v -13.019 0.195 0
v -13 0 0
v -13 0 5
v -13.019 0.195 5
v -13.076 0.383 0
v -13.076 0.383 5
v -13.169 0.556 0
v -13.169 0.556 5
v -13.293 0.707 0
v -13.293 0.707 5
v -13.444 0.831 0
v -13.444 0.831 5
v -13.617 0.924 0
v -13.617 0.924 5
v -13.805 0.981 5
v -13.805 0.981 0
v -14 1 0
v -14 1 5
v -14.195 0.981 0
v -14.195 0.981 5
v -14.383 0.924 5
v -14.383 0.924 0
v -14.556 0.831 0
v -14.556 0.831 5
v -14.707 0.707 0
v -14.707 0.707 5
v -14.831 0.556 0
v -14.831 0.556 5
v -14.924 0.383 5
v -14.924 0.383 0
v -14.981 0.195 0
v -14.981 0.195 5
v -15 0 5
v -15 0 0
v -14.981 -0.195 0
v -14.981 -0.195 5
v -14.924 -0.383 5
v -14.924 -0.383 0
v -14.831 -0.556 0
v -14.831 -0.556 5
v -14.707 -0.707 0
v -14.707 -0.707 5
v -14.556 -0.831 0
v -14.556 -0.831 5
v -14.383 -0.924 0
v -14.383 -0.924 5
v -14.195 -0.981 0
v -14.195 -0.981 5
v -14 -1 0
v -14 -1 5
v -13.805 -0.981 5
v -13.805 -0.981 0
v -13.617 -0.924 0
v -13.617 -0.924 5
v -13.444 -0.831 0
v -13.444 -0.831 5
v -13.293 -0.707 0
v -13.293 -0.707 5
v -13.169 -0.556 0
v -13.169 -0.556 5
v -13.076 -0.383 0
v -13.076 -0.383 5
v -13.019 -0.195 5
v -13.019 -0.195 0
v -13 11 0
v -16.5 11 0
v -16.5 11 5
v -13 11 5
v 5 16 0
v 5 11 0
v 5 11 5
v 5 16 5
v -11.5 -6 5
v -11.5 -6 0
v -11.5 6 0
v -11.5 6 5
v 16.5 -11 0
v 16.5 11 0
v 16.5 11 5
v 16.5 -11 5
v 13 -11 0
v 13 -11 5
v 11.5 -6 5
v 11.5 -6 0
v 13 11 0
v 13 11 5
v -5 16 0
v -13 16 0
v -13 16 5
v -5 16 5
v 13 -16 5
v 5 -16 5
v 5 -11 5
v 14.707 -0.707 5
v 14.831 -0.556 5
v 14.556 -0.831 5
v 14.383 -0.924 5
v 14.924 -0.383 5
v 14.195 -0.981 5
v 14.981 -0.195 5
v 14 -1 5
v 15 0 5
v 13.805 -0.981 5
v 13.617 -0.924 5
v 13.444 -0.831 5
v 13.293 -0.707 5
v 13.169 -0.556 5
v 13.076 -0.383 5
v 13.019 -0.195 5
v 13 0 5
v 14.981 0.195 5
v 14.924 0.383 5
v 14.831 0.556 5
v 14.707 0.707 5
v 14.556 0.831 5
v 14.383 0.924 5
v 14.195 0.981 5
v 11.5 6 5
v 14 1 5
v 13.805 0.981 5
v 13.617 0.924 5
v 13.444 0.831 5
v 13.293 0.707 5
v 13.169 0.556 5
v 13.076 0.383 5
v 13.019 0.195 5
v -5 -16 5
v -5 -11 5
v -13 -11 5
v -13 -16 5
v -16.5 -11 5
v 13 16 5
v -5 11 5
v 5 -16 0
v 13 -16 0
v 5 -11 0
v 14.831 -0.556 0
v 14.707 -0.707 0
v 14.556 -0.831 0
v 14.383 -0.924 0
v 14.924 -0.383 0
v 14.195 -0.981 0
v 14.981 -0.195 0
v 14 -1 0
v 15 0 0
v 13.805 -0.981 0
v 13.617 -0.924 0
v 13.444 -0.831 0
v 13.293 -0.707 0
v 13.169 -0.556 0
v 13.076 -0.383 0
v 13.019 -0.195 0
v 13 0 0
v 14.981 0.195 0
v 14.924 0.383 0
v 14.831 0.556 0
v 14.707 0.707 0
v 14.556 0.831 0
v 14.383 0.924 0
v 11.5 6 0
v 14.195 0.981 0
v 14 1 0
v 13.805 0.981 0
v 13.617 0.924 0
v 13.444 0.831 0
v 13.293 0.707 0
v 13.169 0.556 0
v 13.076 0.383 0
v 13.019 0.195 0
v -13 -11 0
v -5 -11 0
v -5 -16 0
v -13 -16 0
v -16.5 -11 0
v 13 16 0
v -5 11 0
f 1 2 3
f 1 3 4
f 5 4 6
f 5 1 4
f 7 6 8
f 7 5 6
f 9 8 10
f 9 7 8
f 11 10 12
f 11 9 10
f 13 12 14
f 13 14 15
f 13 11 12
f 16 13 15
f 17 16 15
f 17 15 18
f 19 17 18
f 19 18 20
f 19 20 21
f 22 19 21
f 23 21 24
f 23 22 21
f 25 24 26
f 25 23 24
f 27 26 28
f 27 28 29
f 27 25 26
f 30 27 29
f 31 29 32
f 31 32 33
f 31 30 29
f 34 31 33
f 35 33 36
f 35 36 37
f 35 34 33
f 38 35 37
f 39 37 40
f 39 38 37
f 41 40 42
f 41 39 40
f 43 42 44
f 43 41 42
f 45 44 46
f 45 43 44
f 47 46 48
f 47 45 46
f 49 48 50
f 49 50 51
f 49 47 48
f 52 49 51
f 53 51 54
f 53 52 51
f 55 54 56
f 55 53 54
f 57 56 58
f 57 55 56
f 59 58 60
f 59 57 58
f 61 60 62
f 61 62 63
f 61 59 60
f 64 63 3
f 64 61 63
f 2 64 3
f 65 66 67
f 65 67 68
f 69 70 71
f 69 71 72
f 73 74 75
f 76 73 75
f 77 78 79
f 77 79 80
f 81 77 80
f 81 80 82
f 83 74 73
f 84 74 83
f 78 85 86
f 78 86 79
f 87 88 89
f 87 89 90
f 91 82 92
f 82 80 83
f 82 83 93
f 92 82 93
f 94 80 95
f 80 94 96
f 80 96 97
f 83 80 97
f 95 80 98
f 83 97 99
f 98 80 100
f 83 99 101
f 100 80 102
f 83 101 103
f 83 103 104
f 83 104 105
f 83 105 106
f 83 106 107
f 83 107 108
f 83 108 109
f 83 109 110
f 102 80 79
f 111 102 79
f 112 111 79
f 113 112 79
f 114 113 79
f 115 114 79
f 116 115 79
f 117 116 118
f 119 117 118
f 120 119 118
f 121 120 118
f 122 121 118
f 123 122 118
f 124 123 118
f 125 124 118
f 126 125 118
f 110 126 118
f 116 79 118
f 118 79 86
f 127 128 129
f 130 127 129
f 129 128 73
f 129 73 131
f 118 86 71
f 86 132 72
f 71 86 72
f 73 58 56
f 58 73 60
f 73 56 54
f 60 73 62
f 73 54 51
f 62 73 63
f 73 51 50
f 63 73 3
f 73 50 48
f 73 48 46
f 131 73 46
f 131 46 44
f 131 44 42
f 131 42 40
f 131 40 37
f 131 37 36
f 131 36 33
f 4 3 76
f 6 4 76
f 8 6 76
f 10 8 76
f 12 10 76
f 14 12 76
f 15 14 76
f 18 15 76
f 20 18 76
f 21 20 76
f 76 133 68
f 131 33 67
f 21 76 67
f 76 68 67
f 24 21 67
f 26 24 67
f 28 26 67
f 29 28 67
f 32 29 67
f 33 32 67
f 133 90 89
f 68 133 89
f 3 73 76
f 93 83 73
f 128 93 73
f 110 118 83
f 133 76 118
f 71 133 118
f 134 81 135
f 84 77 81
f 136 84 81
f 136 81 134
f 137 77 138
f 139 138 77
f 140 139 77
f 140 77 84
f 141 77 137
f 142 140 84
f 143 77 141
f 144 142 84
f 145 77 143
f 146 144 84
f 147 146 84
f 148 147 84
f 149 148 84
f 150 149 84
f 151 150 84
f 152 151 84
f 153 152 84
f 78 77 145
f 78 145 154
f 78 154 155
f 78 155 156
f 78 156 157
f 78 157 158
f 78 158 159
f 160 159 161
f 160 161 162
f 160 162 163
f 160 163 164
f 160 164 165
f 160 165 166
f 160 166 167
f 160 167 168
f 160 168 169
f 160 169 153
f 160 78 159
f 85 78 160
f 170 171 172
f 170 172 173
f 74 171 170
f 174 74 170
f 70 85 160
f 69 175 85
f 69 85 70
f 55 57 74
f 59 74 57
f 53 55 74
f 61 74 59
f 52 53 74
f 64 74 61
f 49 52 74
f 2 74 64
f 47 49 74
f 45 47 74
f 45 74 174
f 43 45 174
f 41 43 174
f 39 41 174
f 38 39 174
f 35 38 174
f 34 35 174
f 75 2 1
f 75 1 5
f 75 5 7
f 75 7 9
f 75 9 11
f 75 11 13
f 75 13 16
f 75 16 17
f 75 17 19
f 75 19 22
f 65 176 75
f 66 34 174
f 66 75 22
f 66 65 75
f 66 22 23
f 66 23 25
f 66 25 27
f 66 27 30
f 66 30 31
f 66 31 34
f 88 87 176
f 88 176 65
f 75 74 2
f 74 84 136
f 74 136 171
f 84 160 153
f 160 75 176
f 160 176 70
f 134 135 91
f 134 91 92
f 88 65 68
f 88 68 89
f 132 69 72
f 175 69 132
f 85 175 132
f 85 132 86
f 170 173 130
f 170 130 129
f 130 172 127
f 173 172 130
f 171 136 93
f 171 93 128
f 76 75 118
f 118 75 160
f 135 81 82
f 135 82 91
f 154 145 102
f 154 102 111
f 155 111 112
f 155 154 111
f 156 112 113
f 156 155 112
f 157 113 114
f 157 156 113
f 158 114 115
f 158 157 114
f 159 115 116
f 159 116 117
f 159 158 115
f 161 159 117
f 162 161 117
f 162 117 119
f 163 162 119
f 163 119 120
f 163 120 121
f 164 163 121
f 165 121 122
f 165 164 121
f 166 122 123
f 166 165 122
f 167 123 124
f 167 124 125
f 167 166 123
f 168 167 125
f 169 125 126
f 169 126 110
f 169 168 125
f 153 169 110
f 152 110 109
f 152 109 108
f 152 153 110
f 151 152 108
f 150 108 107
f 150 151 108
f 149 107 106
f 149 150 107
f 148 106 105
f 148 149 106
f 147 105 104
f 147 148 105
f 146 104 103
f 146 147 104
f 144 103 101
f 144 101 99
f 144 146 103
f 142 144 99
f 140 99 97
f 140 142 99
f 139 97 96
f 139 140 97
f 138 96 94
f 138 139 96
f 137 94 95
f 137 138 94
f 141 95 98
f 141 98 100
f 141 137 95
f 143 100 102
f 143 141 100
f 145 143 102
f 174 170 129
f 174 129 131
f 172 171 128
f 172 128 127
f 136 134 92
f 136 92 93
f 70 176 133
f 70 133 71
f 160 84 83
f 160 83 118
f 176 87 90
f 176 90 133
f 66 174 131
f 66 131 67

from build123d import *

# Parameters (mm, degrees)
ESQUISSE1_R        = 1
ESQUISSE1_W        = 23
ESQUISSE1_H        = 12.000000104
BOSS_EXTRU_1_DEPTH = 5


with BuildPart() as part:
    # Esquisse1 → Boss.-Extru.1 (new body)
    with BuildSketch(Plane.XY):
        Polygon((5, 11), (5, 16), (13, 16), (13, 11), (16.5, 11), (16.5, -11), (13, -11), (13, -16), (5, -16), (5, -11), (-5, -11), (-5, -16), (-13, -16), (-13, -11), (-16.5, -11), (-16.5, 11), (-13, 11), (-13, 16), (-5, 16), (-5, 11), align=None)
        with Locations((-14, 0)):
            Circle(ESQUISSE1_R, mode=Mode.SUBTRACT)
        with Locations((14, 0)):
            Circle(ESQUISSE1_R, mode=Mode.SUBTRACT)
        Rectangle(ESQUISSE1_W, ESQUISSE1_H, mode=Mode.SUBTRACT)
    extrude(amount=BOSS_EXTRU_1_DEPTH)


solid = part.part
